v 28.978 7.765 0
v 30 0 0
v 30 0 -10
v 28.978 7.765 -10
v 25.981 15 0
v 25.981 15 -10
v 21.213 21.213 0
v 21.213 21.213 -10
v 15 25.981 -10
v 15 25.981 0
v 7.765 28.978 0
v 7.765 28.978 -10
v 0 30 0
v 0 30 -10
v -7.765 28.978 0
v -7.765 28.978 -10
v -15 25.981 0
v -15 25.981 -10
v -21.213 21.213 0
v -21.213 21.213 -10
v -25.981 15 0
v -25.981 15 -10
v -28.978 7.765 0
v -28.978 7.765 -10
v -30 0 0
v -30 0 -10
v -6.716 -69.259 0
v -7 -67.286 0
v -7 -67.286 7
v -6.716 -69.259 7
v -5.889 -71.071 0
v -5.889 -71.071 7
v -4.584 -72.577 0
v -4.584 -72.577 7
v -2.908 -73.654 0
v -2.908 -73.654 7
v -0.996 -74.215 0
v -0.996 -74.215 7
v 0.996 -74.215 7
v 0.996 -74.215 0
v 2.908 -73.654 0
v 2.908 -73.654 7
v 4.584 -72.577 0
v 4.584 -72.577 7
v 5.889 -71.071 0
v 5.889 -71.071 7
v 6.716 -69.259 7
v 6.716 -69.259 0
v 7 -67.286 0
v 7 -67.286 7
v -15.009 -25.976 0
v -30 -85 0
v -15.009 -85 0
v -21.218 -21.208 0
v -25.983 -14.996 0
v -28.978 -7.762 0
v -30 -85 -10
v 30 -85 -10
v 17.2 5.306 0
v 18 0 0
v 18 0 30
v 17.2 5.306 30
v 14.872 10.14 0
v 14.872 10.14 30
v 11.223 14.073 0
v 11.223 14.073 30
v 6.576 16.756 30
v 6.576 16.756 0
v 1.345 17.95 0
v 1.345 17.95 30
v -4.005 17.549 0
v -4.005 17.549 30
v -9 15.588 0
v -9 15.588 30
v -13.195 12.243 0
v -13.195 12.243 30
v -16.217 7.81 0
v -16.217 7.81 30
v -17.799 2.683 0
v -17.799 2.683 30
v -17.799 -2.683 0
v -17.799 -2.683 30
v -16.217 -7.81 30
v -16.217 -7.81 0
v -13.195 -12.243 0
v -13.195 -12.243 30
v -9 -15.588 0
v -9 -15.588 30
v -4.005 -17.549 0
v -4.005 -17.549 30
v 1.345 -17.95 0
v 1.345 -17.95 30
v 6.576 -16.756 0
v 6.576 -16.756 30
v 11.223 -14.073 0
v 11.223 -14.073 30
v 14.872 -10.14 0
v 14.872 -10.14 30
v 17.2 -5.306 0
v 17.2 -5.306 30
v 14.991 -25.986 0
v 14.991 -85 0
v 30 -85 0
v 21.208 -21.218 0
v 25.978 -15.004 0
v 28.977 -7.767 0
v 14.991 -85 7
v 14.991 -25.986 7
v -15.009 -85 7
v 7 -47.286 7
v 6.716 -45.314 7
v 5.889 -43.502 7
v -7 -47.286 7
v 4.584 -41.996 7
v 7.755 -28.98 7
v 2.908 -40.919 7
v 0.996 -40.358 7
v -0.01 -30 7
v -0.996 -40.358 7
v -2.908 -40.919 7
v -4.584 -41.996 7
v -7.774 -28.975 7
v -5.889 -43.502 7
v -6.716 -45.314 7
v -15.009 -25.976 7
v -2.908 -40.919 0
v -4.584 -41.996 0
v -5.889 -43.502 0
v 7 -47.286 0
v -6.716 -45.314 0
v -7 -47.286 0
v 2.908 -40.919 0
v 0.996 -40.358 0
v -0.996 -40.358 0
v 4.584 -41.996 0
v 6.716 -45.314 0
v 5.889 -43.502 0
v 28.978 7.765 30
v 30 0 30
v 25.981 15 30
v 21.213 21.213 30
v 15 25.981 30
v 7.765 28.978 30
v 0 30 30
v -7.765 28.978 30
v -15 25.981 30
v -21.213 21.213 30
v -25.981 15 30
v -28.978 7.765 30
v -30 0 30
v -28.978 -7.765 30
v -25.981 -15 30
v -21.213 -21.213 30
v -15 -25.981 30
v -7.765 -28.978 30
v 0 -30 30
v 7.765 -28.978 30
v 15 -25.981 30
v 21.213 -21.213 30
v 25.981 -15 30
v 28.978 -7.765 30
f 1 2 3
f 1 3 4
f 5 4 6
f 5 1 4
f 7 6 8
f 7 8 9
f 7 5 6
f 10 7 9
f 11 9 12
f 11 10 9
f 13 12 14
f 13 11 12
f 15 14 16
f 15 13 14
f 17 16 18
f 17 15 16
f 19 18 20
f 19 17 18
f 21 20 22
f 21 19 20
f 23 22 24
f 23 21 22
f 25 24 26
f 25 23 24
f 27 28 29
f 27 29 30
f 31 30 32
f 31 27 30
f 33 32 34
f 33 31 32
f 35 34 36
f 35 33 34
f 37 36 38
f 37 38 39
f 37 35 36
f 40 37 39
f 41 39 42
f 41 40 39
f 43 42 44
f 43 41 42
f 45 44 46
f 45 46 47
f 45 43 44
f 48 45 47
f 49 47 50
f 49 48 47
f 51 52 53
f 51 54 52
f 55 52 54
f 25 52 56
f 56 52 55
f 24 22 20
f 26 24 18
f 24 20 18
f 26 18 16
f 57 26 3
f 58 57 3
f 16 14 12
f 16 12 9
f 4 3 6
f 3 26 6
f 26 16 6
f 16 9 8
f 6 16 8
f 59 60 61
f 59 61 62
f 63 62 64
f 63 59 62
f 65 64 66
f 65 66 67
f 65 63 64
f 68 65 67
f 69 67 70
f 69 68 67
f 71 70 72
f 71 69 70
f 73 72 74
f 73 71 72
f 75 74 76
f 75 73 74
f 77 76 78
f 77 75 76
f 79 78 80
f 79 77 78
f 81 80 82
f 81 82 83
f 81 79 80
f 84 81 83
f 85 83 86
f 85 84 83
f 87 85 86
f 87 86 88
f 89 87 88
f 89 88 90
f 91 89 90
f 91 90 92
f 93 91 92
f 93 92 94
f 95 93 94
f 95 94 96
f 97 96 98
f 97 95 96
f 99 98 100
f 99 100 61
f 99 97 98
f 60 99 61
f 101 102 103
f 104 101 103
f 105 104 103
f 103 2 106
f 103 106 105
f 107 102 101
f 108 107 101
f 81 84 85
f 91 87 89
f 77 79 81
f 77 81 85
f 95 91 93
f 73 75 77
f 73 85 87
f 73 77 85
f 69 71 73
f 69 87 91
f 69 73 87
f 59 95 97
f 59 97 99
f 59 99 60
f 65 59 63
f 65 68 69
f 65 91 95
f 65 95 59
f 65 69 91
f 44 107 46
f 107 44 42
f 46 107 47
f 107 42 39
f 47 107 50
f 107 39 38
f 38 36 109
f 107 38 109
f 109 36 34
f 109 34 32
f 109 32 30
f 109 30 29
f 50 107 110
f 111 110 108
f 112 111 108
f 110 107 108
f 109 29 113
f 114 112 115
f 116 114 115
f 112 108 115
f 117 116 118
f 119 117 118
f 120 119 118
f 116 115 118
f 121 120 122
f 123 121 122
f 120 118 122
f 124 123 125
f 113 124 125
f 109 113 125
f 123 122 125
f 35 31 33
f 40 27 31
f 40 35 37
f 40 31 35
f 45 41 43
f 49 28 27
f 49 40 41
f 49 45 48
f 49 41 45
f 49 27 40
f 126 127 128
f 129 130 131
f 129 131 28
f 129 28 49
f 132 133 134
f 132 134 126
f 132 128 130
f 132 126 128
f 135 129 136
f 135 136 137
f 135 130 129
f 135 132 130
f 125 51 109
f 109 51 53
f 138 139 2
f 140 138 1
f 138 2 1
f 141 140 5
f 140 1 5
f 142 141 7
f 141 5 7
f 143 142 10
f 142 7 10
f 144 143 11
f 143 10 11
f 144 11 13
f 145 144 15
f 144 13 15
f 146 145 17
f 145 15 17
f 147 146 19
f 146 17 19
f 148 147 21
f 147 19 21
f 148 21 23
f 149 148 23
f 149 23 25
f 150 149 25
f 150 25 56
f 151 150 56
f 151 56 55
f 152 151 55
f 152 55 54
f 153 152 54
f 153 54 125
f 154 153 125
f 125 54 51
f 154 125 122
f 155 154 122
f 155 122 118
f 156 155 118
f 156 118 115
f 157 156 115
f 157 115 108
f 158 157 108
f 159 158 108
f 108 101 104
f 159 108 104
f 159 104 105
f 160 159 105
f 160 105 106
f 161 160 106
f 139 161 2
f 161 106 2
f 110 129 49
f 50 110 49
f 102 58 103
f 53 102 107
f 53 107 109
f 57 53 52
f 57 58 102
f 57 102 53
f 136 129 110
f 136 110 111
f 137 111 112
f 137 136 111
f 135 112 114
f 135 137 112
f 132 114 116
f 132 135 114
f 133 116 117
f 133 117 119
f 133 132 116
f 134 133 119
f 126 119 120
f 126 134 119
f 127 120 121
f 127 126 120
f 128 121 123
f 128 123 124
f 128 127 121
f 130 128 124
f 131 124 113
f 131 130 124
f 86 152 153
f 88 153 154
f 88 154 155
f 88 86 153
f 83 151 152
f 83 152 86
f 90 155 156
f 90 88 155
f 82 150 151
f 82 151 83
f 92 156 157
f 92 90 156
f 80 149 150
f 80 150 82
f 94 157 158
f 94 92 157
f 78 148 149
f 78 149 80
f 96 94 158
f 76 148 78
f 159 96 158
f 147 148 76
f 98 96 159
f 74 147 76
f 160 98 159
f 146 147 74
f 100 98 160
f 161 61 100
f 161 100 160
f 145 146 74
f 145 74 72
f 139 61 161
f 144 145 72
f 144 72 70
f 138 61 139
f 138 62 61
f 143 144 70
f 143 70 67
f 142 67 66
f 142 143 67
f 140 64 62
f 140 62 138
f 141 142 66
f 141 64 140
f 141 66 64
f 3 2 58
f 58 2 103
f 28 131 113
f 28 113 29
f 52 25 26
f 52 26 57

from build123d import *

# Parameters (mm, degrees)
SKETCH001_R   = 30
SKETCH001_R_2 = 18
PAD_DEPTH     = 30
PAD001_DEPTH  = 10
PAD002_DEPTH  = 7


with BuildPart() as part:
    # Sketch001 (on Sketch) → Pad (new body)
    with BuildSketch(Plane.XY):
        Circle(SKETCH001_R)
        Circle(SKETCH001_R_2, mode=Mode.SUBTRACT)
    extrude(amount=PAD_DEPTH)

    # Sketch002 (on Sketch) → Pad001 (join)
    with BuildSketch(Plane.XY):
        with BuildLine():
            ThreePointArc((30, 4.5e-05), (0, 30), (-30, 4.5e-05))
            Line((-30, 4.5e-05), (-30, -85))
            Line((30, -85), (-30, -85))
            Line((30, 4.5e-05), (30, -85))
        make_face()
    extrude(amount=-PAD001_DEPTH)

    # Sketch003 (on Sketch) → Pad002 (join)
    with BuildSketch(Plane.XY):
        with BuildLine():
            ThreePointArc((-15.008511, -25.975846), (-0.009828, -29.999998), (14.991489, -25.985674))
            Line((14.991489, -85), (14.991489, -25.985674))
            Line((14.991489, -85), (-15.008511, -85))
            Line((-15.008511, -25.975846), (-15.008511, -85))
        make_face()
        with BuildLine():
            ThreePointArc((7, -47.28644), (0, -40.28644), (-7, -47.28644))
            Line((-7, -47.28644), (-7, -67.28644))
            ThreePointArc((-7, -67.28644), (0, -74.28644), (7, -67.28644))
            Line((7, -47.28644), (7, -67.28644))
        make_face(mode=Mode.SUBTRACT)
    extrude(amount=PAD002_DEPTH)


solid = part.part
